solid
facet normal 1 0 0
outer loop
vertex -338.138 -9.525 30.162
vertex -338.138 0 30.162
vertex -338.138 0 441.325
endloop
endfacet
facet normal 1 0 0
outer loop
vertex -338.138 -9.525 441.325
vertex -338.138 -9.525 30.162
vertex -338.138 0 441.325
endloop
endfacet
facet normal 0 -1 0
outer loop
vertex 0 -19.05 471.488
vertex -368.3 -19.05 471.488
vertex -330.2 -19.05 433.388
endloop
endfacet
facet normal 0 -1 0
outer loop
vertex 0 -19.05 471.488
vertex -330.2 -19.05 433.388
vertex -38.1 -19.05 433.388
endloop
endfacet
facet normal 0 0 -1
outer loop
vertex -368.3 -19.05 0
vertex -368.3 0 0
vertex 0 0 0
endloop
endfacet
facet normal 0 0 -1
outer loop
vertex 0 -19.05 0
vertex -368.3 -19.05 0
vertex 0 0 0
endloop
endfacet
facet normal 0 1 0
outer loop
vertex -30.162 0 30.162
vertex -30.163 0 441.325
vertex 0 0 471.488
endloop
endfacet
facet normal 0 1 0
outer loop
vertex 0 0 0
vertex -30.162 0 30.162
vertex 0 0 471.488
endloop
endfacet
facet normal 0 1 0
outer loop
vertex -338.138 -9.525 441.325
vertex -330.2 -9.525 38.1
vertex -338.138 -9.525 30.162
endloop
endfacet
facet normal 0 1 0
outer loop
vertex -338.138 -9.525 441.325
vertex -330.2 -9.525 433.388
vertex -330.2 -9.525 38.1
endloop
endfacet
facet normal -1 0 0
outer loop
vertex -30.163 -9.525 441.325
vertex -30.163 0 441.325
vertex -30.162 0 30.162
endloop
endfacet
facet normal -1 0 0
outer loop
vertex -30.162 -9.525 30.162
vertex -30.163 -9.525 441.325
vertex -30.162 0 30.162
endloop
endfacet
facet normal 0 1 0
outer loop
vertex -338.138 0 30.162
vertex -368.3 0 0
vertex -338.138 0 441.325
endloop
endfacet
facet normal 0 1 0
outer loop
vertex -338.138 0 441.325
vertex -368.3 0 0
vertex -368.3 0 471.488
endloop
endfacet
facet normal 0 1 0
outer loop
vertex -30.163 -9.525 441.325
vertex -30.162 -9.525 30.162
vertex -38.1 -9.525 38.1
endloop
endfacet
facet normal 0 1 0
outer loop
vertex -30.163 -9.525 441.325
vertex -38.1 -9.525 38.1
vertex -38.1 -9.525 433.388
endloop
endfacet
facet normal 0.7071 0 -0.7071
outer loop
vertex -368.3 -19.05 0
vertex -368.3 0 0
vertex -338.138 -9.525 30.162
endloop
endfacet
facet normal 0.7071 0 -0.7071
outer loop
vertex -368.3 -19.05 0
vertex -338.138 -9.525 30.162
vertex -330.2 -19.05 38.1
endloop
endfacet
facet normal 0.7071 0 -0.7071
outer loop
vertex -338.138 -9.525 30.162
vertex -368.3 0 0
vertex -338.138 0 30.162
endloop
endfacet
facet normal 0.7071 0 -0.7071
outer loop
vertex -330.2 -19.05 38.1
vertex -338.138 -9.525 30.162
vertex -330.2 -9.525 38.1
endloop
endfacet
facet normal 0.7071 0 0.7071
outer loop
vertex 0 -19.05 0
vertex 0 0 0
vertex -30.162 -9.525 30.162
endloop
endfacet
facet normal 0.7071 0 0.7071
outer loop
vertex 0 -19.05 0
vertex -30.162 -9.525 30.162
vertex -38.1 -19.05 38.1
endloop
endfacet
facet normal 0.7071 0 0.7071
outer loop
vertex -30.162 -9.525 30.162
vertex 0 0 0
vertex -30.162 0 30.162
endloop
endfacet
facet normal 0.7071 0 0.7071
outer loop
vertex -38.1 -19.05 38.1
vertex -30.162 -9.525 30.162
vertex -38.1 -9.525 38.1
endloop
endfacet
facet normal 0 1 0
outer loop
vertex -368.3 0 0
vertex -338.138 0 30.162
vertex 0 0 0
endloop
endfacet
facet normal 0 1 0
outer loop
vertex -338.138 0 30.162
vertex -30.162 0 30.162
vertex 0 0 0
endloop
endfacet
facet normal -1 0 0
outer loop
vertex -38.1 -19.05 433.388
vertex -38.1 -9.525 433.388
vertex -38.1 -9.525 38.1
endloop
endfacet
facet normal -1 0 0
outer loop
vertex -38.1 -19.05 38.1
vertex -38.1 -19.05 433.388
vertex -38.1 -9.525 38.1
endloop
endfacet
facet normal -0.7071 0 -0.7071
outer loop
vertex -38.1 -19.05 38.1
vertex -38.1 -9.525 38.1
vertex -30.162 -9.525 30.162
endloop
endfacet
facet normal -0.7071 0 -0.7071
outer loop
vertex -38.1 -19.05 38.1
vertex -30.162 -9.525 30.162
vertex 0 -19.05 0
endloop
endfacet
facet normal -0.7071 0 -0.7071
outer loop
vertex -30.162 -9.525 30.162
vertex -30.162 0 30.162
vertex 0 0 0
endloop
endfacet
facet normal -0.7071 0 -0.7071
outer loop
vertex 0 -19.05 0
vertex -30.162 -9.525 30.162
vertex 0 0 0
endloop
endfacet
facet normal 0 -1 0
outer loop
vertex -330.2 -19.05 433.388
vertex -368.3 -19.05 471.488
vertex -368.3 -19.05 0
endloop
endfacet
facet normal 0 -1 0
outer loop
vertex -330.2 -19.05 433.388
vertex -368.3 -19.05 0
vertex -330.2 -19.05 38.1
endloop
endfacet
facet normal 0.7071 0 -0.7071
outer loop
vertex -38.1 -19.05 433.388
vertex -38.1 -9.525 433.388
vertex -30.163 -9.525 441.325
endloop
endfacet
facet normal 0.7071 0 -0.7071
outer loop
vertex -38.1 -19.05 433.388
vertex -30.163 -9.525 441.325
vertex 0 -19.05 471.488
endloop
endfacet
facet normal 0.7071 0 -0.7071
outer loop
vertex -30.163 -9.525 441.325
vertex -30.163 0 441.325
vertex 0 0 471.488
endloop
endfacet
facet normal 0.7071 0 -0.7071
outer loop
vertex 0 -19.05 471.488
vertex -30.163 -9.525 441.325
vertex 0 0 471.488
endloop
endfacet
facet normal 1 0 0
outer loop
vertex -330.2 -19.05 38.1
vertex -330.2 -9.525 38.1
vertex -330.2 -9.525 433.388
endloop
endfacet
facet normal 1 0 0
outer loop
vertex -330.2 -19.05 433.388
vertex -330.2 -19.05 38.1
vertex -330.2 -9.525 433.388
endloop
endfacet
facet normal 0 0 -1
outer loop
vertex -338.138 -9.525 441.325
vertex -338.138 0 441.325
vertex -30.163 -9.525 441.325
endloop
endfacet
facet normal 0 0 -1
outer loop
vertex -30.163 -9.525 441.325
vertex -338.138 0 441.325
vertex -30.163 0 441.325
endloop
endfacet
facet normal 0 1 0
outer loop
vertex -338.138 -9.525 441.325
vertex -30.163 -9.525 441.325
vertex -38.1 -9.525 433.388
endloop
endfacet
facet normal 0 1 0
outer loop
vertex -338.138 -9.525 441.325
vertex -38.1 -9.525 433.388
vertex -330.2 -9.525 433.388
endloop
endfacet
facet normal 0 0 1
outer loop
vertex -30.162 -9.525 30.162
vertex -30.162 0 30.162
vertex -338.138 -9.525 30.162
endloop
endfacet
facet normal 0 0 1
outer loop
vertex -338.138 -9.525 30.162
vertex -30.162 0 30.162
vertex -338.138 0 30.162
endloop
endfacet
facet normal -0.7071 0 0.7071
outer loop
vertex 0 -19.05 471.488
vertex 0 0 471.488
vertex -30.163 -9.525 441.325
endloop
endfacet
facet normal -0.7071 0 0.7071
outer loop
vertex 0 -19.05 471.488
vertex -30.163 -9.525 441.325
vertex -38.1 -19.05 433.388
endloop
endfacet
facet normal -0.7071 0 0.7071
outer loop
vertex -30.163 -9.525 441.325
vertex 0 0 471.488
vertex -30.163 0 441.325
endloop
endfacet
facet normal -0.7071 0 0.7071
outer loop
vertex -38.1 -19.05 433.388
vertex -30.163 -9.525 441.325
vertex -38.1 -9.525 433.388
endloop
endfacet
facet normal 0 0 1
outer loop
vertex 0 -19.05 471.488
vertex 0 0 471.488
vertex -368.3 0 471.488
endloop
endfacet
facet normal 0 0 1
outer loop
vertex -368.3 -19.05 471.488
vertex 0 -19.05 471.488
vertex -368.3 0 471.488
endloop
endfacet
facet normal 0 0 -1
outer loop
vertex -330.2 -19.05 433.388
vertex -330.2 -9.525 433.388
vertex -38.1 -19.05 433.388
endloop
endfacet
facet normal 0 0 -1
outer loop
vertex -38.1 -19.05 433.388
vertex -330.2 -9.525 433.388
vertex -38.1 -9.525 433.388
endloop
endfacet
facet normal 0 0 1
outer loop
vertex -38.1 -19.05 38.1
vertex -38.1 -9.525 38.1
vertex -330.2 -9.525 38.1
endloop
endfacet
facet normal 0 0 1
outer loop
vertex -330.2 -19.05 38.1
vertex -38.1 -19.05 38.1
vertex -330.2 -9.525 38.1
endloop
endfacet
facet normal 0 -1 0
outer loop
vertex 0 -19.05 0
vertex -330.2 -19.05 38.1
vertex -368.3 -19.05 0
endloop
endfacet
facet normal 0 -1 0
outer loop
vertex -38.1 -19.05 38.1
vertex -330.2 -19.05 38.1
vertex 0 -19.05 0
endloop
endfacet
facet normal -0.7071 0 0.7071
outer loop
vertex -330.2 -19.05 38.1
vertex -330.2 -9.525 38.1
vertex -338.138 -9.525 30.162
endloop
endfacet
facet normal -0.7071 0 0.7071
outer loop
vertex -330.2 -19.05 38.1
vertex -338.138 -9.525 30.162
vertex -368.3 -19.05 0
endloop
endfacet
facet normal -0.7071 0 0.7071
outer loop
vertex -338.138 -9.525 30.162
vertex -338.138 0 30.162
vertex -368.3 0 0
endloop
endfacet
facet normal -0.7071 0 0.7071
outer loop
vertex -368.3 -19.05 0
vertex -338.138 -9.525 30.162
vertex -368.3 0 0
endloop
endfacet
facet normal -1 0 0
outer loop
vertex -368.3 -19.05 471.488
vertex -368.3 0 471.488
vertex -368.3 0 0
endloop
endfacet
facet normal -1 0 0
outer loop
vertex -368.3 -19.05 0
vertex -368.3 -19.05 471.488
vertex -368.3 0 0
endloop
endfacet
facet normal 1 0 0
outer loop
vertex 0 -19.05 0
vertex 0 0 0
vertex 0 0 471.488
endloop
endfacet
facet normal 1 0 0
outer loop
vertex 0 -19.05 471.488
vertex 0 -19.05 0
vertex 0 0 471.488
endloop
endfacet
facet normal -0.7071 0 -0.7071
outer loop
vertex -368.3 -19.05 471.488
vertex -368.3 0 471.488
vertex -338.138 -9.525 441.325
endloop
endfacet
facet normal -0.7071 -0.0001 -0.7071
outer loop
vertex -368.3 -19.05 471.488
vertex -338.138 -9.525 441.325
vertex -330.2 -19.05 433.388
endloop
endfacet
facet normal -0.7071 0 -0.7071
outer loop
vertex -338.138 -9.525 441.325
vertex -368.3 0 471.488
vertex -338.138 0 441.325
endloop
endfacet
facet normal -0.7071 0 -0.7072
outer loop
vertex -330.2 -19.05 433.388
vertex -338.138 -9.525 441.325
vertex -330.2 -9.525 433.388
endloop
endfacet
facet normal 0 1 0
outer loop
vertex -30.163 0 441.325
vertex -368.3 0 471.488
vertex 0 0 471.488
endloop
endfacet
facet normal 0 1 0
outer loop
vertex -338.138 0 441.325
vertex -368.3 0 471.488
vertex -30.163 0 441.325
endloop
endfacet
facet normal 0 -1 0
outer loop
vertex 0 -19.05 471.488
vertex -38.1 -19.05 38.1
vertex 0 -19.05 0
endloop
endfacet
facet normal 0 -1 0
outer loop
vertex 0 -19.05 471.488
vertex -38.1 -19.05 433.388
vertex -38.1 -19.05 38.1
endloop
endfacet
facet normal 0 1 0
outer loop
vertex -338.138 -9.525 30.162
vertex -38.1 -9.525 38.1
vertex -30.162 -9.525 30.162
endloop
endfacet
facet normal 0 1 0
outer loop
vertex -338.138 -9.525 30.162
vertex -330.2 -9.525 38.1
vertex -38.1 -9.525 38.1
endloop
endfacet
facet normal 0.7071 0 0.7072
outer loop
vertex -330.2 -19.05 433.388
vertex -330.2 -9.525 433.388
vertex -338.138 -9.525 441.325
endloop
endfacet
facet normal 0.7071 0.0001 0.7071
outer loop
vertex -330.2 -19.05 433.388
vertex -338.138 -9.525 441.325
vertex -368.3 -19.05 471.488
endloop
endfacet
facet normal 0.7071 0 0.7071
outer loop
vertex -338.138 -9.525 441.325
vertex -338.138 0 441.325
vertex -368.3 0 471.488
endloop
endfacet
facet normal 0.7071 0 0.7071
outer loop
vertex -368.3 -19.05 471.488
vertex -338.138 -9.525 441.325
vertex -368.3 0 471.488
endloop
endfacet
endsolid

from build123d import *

# Parameters (mm, degrees)
F1_DEPTH = 19.05
F2_DEPTH = 19.05
F3_DEPTH = 19.05
F4_DEPTH = 19.05
F6_DEPTH = 9.525


with BuildPart() as f1:
    # F0 (on Front) → F1 (new body)
    with BuildSketch(Plane.XZ):
        Polygon((-38.1, 38.1), (0, 0), (0, 471.4875), (-38.1, 433.3875), align=None)
    extrude(amount=F1_DEPTH)


with BuildPart() as f2:
    # F0 (on Front) → F2 (new body)
    with BuildSketch(Plane.XZ):
        Polygon((-38.1, 433.3875), (0, 471.4875), (-368.3, 471.4875), (-330.2, 433.3875), align=None)
    extrude(amount=F2_DEPTH)


with BuildPart() as f3:
    # F0 (on Front) → F3 (new body)
    with BuildSketch(Plane.XZ):
        Polygon((-368.3, 471.4875), (-368.3, 0), (-330.2, 38.1), (-330.2, 433.3875), align=None)
    extrude(amount=F3_DEPTH)


with BuildPart() as f4:
    # F0 (on Front) → F4 (new body)
    with BuildSketch(Plane.XZ):
        Polygon((-368.3, 0), (0, 0), (-38.1, 38.1), (-330.2, 38.1), align=None)
    extrude(amount=F4_DEPTH)


with BuildPart() as f6_tool:
    # F5 (on face) → F6 (new body)
    with BuildSketch(Plane(origin=(0, 0, 0), x_dir=(-1, 0, 0), z_dir=(0, 1, 0))):
        Polygon((30.1625, 30.1625), (338.1375, 30.1625), (338.1375, 441.325), (330.2, 433.3875), (330.2, 38.1), (38.1, 38.1), (38.1, 433.3875), (30.1625, 441.325), align=None)
        Polygon((330.2, 433.3875), (338.1375, 441.325), (30.1625, 441.325), (38.1, 433.3875), align=None)
    extrude(amount=-F6_DEPTH)


with BuildPart() as f1_1:
    add(f1.part)

    # F6: cut by f6_tool
    add(f6_tool.part, mode=Mode.SUBTRACT)


with BuildPart() as f2_1:
    add(f2.part)

    # F6: cut by f6_tool
    add(f6_tool.part, mode=Mode.SUBTRACT)


with BuildPart() as f3_1:
    add(f3.part)

    # F6: cut by f6_tool
    add(f6_tool.part, mode=Mode.SUBTRACT)


with BuildPart() as f4_1:
    add(f4.part)

    # F6: cut by f6_tool
    add(f6_tool.part, mode=Mode.SUBTRACT)


solid = Compound([f1_1.part, f2_1.part, f3_1.part, f4_1.part])
